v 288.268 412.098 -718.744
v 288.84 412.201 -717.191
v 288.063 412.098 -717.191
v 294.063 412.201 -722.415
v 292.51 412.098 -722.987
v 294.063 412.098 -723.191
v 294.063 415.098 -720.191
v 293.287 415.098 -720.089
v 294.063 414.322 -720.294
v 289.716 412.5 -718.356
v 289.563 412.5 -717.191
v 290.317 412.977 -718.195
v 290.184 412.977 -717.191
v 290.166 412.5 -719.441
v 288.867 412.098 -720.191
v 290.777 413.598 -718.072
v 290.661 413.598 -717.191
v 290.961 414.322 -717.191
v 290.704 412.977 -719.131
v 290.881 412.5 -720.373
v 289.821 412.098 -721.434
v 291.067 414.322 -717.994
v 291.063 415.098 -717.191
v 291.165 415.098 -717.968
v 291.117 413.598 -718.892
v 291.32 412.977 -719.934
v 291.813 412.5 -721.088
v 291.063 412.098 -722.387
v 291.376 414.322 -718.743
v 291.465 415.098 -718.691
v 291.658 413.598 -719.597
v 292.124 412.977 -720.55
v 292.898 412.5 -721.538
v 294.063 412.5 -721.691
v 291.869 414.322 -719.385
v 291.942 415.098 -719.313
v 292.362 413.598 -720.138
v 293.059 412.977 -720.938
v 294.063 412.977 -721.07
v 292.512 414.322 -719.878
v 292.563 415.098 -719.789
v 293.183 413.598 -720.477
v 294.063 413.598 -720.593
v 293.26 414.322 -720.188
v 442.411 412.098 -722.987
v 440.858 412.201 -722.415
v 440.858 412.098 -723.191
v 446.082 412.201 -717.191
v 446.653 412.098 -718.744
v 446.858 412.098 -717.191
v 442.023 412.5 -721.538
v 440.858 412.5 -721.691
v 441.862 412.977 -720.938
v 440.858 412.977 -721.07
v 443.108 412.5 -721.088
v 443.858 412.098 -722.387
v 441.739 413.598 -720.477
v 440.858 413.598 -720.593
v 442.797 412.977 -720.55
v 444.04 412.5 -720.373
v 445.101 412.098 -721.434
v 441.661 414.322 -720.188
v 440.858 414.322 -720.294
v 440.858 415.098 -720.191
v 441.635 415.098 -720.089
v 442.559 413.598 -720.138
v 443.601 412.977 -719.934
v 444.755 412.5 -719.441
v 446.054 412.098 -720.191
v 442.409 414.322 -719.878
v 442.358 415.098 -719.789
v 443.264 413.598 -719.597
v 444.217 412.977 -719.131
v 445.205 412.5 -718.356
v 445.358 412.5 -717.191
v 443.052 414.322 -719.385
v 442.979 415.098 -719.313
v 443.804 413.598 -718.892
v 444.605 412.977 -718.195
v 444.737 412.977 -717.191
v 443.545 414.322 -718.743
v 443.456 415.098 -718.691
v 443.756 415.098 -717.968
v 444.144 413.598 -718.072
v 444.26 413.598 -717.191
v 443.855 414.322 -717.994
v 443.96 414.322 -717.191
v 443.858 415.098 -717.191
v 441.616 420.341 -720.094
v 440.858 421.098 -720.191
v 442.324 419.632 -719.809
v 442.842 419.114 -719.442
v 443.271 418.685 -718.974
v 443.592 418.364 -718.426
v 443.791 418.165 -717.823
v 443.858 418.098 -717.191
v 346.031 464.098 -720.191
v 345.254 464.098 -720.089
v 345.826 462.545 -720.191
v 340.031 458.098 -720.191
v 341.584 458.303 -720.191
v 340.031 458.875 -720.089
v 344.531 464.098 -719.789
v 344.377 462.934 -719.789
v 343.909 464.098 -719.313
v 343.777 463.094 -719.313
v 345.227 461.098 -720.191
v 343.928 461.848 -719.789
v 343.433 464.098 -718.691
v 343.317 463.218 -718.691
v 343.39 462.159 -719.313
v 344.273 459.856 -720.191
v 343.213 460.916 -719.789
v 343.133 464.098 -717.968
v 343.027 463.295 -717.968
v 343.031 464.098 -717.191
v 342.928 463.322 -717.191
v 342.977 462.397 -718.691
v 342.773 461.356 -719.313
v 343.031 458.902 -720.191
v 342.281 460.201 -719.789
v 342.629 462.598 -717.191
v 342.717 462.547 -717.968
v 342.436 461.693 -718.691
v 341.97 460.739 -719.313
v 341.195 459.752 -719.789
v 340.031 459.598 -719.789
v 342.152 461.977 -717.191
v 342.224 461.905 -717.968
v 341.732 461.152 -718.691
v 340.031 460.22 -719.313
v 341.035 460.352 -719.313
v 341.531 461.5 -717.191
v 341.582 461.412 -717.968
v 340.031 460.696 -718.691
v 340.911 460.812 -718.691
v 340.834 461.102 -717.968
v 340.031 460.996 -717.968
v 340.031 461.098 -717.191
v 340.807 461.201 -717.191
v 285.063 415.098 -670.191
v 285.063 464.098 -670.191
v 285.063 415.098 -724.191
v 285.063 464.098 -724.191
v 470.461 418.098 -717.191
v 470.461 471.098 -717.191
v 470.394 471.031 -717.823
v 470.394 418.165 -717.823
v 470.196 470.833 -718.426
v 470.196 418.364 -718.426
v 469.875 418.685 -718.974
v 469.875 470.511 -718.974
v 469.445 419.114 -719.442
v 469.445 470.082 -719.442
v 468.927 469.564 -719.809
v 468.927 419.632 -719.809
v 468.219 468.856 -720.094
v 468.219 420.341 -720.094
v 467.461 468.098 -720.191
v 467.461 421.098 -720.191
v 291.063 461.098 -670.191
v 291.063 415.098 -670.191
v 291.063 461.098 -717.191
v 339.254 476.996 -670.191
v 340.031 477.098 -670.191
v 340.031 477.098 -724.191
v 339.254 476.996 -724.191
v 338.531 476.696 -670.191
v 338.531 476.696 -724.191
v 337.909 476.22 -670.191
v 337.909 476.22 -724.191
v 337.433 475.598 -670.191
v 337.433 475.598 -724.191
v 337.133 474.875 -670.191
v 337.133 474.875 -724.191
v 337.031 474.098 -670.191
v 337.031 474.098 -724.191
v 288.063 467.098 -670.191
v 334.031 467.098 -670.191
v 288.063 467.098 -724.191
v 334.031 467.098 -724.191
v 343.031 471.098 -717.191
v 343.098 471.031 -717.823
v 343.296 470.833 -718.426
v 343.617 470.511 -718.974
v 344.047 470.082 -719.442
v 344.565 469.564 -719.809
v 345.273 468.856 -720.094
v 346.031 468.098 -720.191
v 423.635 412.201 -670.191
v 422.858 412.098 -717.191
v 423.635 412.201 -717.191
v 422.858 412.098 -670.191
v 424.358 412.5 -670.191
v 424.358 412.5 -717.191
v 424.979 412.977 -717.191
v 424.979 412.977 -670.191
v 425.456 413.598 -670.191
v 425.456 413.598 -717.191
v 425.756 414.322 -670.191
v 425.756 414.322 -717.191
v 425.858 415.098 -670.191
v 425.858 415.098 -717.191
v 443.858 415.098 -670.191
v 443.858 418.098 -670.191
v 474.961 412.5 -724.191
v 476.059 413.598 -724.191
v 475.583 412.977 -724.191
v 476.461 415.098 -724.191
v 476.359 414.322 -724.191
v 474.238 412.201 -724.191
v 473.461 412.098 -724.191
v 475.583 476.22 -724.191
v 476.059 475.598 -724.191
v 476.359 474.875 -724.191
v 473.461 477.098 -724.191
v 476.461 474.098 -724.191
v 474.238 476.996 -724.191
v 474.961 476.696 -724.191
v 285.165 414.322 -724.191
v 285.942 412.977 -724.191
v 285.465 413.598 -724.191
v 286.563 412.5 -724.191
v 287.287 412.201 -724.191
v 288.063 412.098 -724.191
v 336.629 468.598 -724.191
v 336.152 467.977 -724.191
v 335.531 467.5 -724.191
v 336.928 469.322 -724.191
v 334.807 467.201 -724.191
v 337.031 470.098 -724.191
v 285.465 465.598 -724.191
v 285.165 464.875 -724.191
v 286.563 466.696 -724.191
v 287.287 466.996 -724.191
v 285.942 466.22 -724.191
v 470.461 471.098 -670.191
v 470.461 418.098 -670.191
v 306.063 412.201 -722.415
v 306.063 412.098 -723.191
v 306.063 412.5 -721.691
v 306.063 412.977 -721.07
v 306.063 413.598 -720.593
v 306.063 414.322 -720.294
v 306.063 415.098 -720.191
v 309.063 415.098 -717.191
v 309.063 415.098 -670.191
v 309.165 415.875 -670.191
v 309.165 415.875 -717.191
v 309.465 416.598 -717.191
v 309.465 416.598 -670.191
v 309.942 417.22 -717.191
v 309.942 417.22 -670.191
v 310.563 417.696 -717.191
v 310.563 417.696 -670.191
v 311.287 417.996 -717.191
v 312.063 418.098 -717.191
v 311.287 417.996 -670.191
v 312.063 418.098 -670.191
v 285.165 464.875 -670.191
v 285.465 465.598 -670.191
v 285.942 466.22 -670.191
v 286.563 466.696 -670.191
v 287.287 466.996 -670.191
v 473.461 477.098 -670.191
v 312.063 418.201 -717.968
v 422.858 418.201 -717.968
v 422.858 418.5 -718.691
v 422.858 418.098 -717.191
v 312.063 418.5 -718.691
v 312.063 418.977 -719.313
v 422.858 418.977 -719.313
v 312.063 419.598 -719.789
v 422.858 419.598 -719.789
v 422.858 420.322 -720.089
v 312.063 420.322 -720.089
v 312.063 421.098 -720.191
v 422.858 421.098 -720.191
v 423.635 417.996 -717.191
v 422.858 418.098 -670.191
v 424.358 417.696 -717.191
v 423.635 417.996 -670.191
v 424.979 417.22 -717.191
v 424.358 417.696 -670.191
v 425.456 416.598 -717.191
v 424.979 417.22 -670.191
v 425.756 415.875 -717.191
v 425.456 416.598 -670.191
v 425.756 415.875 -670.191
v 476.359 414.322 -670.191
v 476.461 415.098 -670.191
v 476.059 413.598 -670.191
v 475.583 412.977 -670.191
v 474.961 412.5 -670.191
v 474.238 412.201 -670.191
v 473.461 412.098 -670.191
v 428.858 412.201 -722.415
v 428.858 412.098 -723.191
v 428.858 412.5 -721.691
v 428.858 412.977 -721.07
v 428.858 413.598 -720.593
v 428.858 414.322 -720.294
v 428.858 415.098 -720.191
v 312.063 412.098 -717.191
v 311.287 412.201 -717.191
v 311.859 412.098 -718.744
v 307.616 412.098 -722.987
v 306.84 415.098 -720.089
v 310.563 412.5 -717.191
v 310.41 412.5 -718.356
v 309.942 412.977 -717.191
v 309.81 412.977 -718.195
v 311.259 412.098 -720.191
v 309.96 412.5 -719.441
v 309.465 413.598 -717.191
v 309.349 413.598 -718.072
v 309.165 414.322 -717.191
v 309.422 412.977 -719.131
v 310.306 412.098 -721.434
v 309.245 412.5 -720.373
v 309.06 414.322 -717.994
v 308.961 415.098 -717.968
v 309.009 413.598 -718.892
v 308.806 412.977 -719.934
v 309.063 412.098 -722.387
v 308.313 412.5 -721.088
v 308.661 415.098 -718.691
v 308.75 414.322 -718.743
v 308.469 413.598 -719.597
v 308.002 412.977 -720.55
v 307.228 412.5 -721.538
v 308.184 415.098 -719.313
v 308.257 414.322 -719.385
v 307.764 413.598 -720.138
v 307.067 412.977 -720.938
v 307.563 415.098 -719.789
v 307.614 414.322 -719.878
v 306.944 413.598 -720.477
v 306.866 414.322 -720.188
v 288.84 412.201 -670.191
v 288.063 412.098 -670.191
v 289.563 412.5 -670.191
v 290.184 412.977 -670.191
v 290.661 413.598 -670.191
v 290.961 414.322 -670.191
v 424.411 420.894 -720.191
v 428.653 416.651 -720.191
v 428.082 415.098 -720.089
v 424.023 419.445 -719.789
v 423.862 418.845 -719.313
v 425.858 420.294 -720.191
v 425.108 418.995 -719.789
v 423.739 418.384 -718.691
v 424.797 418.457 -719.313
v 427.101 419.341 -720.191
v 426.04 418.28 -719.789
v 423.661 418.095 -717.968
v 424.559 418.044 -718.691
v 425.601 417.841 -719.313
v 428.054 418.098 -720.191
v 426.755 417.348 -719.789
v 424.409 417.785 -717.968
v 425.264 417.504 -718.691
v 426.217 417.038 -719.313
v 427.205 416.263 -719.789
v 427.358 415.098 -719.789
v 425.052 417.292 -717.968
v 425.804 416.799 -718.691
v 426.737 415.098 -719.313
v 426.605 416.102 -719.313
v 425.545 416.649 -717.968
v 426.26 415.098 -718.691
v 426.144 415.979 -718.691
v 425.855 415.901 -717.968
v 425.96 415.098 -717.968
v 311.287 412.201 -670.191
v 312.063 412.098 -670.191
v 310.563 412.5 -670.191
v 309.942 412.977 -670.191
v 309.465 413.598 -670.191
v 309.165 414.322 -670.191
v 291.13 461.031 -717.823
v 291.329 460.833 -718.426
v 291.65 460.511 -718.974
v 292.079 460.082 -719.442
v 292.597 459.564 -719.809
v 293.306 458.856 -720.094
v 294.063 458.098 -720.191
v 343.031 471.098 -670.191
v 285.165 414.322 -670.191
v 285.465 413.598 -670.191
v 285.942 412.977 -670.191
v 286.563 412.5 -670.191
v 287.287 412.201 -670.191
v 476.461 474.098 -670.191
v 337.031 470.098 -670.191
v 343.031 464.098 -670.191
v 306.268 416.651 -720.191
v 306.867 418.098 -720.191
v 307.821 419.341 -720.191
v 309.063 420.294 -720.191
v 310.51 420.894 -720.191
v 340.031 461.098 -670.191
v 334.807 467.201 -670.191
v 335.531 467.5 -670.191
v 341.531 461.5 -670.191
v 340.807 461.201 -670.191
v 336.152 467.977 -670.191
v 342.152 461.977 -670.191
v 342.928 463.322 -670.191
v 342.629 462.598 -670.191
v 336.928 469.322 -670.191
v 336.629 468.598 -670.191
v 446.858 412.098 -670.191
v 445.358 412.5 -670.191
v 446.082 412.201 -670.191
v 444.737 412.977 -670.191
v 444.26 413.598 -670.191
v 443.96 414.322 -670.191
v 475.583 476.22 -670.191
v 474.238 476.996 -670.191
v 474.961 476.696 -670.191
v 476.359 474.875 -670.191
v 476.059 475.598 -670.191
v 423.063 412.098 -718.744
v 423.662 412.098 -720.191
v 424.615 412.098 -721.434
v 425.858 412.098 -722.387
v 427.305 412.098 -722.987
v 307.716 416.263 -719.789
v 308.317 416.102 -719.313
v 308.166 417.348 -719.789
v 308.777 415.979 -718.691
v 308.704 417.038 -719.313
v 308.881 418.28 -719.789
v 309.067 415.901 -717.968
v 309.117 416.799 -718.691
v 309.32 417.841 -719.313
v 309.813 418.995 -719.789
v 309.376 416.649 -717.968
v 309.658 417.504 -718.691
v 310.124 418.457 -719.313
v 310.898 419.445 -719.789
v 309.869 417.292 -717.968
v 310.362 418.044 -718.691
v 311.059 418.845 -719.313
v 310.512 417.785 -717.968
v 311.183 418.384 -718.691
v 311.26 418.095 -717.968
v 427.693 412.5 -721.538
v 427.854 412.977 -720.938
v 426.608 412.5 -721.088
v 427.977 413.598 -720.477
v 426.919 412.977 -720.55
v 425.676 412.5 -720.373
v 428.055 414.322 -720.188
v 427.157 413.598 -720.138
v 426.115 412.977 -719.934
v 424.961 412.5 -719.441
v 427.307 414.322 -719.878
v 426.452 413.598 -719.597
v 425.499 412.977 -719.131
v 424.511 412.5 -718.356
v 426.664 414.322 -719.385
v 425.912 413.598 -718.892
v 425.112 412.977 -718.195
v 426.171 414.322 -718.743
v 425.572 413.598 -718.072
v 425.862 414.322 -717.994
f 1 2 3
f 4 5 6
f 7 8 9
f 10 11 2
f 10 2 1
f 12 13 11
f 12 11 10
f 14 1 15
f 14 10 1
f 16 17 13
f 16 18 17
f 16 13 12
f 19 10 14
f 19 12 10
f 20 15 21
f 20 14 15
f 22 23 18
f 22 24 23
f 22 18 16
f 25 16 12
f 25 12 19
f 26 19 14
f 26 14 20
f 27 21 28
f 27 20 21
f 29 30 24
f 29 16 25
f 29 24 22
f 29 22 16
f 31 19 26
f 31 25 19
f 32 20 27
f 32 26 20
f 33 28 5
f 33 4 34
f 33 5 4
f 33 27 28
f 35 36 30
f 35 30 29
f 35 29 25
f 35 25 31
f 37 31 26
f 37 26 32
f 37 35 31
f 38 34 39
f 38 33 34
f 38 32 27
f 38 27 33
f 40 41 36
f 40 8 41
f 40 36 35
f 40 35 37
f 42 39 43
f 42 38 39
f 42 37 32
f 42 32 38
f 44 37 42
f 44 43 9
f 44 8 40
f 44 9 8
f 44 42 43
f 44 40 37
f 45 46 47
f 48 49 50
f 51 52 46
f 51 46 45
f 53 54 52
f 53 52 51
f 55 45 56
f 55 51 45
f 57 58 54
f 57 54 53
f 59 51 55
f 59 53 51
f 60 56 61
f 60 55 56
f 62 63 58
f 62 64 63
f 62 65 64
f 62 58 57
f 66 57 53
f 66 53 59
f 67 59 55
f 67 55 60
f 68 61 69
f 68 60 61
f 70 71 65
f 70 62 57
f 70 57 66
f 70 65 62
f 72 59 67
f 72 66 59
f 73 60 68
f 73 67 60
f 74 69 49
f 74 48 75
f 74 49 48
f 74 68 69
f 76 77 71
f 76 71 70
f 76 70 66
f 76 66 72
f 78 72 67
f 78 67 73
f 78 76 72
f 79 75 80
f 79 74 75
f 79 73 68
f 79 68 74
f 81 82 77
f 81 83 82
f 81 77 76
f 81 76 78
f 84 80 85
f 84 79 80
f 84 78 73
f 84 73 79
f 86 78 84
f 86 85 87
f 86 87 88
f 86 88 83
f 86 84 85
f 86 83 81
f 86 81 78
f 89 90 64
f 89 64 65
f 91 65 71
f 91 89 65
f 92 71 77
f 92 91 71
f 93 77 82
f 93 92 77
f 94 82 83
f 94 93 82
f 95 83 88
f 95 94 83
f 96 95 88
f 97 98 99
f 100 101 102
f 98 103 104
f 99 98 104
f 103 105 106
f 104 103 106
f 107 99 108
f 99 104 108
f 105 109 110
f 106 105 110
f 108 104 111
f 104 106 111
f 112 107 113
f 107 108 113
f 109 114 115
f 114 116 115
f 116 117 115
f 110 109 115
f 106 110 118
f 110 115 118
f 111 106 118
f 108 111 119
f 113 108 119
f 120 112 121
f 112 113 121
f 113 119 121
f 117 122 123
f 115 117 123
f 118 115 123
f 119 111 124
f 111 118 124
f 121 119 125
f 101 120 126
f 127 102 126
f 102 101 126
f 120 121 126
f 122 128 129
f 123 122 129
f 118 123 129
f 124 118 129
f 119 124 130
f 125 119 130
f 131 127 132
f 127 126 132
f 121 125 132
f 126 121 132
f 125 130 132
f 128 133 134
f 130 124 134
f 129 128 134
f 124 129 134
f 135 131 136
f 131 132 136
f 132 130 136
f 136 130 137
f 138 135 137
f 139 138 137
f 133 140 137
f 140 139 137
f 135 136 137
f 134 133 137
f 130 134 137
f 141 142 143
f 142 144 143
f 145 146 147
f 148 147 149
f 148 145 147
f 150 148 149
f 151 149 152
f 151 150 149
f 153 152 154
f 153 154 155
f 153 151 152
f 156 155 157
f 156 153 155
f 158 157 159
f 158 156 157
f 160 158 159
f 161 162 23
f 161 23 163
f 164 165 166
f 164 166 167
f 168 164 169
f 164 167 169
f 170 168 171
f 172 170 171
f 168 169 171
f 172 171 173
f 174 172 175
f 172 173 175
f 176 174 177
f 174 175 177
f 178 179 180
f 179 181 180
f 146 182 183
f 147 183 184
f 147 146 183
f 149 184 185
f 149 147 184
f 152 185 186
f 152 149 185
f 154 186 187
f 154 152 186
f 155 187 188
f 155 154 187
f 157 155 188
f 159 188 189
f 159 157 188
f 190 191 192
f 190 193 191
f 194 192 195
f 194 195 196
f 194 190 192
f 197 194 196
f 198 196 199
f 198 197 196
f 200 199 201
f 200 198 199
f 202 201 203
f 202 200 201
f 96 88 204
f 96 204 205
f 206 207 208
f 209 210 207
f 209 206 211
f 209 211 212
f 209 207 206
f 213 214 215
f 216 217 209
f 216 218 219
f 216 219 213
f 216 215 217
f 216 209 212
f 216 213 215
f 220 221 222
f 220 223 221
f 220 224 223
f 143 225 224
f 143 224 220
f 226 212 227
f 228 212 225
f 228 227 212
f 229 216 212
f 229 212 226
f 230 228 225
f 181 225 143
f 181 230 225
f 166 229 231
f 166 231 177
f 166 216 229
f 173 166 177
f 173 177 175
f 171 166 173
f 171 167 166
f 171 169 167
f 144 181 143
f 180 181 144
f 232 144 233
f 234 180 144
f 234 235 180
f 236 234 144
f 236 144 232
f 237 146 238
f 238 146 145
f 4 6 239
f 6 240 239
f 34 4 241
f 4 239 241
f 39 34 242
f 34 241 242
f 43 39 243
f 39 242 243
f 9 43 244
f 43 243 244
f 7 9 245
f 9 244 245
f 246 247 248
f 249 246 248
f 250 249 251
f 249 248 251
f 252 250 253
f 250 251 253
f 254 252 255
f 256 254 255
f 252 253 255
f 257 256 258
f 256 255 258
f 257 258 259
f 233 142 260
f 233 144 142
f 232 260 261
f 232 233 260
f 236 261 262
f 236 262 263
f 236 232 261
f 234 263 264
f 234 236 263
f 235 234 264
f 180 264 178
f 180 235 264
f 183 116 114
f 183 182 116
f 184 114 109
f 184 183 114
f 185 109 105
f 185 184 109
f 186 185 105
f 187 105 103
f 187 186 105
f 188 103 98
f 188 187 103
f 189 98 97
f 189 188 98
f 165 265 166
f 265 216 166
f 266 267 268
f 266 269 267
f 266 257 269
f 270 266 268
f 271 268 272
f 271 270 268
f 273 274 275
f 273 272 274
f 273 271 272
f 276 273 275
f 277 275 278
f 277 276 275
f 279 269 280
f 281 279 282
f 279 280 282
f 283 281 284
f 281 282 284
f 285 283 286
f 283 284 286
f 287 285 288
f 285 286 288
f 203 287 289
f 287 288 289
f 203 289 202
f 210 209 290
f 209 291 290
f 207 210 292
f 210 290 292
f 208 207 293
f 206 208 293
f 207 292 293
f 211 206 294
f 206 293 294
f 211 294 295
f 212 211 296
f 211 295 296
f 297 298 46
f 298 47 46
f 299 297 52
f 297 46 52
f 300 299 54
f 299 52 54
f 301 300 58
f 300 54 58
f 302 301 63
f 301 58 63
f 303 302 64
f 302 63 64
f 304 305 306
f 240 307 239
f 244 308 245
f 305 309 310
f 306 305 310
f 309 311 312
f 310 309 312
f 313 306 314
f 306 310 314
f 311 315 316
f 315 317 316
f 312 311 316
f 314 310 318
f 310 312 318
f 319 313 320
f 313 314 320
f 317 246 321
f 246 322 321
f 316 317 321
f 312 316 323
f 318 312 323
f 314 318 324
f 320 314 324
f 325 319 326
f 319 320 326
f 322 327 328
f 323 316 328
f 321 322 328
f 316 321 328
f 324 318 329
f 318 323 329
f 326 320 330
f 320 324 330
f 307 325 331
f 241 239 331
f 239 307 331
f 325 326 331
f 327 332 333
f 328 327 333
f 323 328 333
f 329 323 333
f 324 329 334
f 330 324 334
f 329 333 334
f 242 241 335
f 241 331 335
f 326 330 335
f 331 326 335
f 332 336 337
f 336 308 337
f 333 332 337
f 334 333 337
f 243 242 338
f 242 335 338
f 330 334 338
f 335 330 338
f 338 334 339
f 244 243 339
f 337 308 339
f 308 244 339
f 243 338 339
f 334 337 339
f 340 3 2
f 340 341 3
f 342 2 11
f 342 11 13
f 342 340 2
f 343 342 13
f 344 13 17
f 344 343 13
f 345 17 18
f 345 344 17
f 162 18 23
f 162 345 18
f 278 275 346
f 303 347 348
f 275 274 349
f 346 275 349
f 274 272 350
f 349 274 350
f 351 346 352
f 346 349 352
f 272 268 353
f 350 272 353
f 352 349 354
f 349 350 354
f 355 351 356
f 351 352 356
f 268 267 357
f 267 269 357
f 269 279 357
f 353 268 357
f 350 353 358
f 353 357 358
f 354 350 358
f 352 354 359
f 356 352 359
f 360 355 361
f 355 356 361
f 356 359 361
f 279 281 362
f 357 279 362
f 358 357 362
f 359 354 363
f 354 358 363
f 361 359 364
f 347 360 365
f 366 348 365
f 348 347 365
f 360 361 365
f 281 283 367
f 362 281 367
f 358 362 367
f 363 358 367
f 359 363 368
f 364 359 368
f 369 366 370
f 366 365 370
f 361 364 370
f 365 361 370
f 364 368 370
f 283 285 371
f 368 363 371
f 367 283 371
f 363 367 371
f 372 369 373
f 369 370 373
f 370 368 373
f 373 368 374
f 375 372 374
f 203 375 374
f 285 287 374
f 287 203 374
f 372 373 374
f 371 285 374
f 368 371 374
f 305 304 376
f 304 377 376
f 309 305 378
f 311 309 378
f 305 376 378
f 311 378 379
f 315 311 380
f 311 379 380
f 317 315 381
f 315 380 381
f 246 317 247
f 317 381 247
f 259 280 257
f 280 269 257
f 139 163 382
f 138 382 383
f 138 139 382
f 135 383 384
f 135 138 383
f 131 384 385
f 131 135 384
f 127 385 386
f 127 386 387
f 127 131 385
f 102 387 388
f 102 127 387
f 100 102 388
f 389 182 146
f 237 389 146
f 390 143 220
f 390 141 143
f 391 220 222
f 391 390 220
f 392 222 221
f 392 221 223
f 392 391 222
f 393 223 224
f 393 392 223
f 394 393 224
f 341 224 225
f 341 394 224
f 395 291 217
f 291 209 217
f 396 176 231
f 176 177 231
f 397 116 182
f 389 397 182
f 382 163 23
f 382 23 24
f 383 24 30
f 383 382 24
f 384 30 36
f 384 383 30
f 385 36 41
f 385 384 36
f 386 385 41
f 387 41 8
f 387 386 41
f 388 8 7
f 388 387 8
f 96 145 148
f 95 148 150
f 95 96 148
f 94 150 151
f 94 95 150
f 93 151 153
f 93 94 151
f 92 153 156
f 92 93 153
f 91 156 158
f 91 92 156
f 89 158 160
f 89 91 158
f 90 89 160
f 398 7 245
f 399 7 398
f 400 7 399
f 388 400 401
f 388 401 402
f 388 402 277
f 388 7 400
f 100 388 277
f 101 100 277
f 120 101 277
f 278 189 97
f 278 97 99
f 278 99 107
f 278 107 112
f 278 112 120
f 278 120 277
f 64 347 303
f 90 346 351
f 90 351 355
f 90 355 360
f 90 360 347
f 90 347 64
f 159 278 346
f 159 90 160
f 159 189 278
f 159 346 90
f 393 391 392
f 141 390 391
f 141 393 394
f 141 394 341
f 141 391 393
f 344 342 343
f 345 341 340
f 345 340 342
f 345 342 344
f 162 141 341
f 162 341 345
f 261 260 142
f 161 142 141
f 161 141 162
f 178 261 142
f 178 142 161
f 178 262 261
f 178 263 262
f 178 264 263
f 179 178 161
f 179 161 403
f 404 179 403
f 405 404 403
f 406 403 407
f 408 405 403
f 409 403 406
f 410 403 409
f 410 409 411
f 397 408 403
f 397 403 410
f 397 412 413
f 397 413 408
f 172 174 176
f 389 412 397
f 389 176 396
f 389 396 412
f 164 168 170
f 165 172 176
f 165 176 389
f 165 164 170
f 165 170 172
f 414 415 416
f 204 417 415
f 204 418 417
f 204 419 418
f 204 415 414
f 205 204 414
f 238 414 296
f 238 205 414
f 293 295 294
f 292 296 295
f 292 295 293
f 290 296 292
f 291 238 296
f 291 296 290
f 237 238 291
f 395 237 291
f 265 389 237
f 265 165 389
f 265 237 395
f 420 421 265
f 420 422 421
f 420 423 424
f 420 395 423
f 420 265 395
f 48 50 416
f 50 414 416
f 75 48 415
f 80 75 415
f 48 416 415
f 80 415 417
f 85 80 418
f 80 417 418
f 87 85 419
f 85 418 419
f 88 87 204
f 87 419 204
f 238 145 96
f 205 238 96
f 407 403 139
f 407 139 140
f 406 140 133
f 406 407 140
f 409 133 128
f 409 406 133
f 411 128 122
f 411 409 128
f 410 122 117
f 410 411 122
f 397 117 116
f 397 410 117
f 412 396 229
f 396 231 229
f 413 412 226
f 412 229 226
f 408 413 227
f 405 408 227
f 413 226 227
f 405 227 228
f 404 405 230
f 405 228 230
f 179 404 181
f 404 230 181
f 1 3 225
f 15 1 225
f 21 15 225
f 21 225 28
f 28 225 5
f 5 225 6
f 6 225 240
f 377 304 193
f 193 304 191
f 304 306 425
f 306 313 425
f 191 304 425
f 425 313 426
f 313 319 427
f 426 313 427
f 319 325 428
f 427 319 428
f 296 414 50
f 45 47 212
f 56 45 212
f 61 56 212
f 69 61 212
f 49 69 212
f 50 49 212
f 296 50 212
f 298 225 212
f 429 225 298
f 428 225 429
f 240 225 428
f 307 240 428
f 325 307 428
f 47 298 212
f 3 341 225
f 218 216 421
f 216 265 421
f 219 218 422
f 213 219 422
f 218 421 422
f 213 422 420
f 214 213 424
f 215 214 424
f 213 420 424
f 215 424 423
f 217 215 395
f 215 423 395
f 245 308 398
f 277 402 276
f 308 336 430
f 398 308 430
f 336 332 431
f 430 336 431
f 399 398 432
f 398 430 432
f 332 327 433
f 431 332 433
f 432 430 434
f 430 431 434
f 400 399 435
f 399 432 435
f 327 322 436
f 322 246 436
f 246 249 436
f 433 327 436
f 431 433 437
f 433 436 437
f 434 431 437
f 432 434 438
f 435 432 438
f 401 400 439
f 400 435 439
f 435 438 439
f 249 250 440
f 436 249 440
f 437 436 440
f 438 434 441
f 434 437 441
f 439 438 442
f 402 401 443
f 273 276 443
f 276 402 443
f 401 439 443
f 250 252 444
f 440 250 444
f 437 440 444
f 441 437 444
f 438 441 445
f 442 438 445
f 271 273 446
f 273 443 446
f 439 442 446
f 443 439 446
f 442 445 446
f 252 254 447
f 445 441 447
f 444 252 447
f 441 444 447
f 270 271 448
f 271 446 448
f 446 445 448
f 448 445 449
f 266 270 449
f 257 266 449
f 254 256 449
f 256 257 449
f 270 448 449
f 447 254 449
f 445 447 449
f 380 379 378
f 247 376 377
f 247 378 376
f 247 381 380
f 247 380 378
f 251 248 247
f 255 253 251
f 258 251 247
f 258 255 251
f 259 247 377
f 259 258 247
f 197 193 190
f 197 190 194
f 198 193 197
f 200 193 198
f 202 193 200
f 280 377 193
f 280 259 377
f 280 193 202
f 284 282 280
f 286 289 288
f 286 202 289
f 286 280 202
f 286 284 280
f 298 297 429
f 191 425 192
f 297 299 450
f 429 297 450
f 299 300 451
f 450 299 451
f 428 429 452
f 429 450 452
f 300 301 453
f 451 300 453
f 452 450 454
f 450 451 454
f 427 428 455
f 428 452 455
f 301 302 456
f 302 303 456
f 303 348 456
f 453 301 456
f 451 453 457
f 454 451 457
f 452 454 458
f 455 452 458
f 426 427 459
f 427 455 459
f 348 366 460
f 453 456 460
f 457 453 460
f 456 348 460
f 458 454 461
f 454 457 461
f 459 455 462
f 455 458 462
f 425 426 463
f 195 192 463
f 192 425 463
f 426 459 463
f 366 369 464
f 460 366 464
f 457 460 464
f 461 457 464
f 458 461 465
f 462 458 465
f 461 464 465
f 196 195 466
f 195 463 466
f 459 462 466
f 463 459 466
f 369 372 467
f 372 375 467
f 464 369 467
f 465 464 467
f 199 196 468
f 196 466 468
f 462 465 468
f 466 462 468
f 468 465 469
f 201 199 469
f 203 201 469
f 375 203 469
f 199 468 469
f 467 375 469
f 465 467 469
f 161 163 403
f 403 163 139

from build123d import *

# Parameters (mm, degrees)
BOSS_EXTRUDE1_DEPTH     = 4
BOSS_EXTRUDE2_DEPTH     = 50
CUT_EXTRUDE1_DEPTH      = 677.427541211
CUT_EXTRUDE1_DEPTH_BACK = 50
SKETCH3_W               = 18
SKETCH3_H               = 6
FILLET3_R               = 3


with BuildPart() as part:
    # Sketch1 → Boss-Extrude1 (new body)
    with BuildSketch(Plane.XY.offset(-724.191392871)):
        Polygon((476.461364297, 467.098298929), (476.461364297, 412.098298929), (285.063110998, 412.098298929), (285.063110998, 467.098298929), (337.030633325, 467.098298929), (337.030633325, 477.098298929), (476.461364297, 477.098298929), align=None)
    extrude(amount=BOSS_EXTRUDE1_DEPTH)

    # Sketch2 → Boss-Extrude2 (add)
    with BuildSketch(Plane.XY.offset(-720.191392871)):
        Polygon((285.063110998, 467.098298929), (285.063110998, 412.098298929), (476.461364297, 412.098298929), (476.461364297, 477.098298929), (337.030633325, 477.098298929), (337.030633325, 467.098298929), align=None)
        Polygon((291.063110998, 461.098298929), (343.030633325, 461.098298929), (343.030633325, 471.098298929), (470.461364297, 471.098298929), (470.461364297, 418.098298929), (291.063110998, 418.098298929), align=None, mode=Mode.SUBTRACT)
    extrude(amount=BOSS_EXTRUDE2_DEPTH)

    # Sketch3 → Cut-Extrude1 (cut, two sides: drawn at the far end of the back side and taken through both)
    with BuildSketch(Plane.XY.offset(-670.191392871).offset(-CUT_EXTRUDE1_DEPTH_BACK)):
        with Locations((300.063110998, 415.098298929)):
            Rectangle(SKETCH3_W, SKETCH3_H)
        with Locations((434.858034082, 415.098298929)):
            Rectangle(SKETCH3_W, SKETCH3_H)
    extrude(amount=CUT_EXTRUDE1_DEPTH + CUT_EXTRUDE1_DEPTH_BACK, mode=Mode.SUBTRACT)

    # Fillet3
    fillet3_edges = [part.edges().sort_by_distance(p)[0] for p in [
        (337.030633325, 477.098298929, -697.191392871),
        (476.461364297, 477.098298929, -697.191392871),
        (476.461364297, 412.098298929, -697.191392871),
        (285.063110998, 412.098298929, -697.191392871),
        (285.063110998, 467.098298929, -697.191392871),
        (337.030633325, 467.098298929, -697.191392871),
        (343.030633325, 461.098298929, -695.191392871),
        (406.745998811, 471.098298929, -720.191392871),
        (343.030633325, 466.098298929, -720.191392871),
        (317.046872162, 461.098298929, -720.191392871),
        (291.063110998, 436.598298929, -720.191392871),
        (470.461364297, 444.598298929, -720.191392871),
        (367.46057254, 418.098298929, -720.191392871),
        (457.159699189, 418.098298929, -720.191392871),
        (309.063110998, 418.098298929, -695.191392871),
        (309.063110998, 415.098298929, -720.191392871),
        (309.063110998, 412.098298929, -695.191392871),
        (291.063110998, 412.098298929, -695.191392871),
        (300.063110998, 412.098298929, -720.191392871),
        (425.858034082, 412.098298929, -695.191392871),
        (425.858034082, 415.098298929, -720.191392871),
        (425.858034082, 418.098298929, -695.191392871),
        (443.858034082, 412.098298929, -695.191392871),
        (443.858034082, 415.098298929, -720.191392871),
        (434.858034082, 412.098298929, -720.191392871),
    ]]
    fillet(fillet3_edges, radius=FILLET3_R - 0.0001)  # a hair under: the kernel refuses the full size


solid = part.part
